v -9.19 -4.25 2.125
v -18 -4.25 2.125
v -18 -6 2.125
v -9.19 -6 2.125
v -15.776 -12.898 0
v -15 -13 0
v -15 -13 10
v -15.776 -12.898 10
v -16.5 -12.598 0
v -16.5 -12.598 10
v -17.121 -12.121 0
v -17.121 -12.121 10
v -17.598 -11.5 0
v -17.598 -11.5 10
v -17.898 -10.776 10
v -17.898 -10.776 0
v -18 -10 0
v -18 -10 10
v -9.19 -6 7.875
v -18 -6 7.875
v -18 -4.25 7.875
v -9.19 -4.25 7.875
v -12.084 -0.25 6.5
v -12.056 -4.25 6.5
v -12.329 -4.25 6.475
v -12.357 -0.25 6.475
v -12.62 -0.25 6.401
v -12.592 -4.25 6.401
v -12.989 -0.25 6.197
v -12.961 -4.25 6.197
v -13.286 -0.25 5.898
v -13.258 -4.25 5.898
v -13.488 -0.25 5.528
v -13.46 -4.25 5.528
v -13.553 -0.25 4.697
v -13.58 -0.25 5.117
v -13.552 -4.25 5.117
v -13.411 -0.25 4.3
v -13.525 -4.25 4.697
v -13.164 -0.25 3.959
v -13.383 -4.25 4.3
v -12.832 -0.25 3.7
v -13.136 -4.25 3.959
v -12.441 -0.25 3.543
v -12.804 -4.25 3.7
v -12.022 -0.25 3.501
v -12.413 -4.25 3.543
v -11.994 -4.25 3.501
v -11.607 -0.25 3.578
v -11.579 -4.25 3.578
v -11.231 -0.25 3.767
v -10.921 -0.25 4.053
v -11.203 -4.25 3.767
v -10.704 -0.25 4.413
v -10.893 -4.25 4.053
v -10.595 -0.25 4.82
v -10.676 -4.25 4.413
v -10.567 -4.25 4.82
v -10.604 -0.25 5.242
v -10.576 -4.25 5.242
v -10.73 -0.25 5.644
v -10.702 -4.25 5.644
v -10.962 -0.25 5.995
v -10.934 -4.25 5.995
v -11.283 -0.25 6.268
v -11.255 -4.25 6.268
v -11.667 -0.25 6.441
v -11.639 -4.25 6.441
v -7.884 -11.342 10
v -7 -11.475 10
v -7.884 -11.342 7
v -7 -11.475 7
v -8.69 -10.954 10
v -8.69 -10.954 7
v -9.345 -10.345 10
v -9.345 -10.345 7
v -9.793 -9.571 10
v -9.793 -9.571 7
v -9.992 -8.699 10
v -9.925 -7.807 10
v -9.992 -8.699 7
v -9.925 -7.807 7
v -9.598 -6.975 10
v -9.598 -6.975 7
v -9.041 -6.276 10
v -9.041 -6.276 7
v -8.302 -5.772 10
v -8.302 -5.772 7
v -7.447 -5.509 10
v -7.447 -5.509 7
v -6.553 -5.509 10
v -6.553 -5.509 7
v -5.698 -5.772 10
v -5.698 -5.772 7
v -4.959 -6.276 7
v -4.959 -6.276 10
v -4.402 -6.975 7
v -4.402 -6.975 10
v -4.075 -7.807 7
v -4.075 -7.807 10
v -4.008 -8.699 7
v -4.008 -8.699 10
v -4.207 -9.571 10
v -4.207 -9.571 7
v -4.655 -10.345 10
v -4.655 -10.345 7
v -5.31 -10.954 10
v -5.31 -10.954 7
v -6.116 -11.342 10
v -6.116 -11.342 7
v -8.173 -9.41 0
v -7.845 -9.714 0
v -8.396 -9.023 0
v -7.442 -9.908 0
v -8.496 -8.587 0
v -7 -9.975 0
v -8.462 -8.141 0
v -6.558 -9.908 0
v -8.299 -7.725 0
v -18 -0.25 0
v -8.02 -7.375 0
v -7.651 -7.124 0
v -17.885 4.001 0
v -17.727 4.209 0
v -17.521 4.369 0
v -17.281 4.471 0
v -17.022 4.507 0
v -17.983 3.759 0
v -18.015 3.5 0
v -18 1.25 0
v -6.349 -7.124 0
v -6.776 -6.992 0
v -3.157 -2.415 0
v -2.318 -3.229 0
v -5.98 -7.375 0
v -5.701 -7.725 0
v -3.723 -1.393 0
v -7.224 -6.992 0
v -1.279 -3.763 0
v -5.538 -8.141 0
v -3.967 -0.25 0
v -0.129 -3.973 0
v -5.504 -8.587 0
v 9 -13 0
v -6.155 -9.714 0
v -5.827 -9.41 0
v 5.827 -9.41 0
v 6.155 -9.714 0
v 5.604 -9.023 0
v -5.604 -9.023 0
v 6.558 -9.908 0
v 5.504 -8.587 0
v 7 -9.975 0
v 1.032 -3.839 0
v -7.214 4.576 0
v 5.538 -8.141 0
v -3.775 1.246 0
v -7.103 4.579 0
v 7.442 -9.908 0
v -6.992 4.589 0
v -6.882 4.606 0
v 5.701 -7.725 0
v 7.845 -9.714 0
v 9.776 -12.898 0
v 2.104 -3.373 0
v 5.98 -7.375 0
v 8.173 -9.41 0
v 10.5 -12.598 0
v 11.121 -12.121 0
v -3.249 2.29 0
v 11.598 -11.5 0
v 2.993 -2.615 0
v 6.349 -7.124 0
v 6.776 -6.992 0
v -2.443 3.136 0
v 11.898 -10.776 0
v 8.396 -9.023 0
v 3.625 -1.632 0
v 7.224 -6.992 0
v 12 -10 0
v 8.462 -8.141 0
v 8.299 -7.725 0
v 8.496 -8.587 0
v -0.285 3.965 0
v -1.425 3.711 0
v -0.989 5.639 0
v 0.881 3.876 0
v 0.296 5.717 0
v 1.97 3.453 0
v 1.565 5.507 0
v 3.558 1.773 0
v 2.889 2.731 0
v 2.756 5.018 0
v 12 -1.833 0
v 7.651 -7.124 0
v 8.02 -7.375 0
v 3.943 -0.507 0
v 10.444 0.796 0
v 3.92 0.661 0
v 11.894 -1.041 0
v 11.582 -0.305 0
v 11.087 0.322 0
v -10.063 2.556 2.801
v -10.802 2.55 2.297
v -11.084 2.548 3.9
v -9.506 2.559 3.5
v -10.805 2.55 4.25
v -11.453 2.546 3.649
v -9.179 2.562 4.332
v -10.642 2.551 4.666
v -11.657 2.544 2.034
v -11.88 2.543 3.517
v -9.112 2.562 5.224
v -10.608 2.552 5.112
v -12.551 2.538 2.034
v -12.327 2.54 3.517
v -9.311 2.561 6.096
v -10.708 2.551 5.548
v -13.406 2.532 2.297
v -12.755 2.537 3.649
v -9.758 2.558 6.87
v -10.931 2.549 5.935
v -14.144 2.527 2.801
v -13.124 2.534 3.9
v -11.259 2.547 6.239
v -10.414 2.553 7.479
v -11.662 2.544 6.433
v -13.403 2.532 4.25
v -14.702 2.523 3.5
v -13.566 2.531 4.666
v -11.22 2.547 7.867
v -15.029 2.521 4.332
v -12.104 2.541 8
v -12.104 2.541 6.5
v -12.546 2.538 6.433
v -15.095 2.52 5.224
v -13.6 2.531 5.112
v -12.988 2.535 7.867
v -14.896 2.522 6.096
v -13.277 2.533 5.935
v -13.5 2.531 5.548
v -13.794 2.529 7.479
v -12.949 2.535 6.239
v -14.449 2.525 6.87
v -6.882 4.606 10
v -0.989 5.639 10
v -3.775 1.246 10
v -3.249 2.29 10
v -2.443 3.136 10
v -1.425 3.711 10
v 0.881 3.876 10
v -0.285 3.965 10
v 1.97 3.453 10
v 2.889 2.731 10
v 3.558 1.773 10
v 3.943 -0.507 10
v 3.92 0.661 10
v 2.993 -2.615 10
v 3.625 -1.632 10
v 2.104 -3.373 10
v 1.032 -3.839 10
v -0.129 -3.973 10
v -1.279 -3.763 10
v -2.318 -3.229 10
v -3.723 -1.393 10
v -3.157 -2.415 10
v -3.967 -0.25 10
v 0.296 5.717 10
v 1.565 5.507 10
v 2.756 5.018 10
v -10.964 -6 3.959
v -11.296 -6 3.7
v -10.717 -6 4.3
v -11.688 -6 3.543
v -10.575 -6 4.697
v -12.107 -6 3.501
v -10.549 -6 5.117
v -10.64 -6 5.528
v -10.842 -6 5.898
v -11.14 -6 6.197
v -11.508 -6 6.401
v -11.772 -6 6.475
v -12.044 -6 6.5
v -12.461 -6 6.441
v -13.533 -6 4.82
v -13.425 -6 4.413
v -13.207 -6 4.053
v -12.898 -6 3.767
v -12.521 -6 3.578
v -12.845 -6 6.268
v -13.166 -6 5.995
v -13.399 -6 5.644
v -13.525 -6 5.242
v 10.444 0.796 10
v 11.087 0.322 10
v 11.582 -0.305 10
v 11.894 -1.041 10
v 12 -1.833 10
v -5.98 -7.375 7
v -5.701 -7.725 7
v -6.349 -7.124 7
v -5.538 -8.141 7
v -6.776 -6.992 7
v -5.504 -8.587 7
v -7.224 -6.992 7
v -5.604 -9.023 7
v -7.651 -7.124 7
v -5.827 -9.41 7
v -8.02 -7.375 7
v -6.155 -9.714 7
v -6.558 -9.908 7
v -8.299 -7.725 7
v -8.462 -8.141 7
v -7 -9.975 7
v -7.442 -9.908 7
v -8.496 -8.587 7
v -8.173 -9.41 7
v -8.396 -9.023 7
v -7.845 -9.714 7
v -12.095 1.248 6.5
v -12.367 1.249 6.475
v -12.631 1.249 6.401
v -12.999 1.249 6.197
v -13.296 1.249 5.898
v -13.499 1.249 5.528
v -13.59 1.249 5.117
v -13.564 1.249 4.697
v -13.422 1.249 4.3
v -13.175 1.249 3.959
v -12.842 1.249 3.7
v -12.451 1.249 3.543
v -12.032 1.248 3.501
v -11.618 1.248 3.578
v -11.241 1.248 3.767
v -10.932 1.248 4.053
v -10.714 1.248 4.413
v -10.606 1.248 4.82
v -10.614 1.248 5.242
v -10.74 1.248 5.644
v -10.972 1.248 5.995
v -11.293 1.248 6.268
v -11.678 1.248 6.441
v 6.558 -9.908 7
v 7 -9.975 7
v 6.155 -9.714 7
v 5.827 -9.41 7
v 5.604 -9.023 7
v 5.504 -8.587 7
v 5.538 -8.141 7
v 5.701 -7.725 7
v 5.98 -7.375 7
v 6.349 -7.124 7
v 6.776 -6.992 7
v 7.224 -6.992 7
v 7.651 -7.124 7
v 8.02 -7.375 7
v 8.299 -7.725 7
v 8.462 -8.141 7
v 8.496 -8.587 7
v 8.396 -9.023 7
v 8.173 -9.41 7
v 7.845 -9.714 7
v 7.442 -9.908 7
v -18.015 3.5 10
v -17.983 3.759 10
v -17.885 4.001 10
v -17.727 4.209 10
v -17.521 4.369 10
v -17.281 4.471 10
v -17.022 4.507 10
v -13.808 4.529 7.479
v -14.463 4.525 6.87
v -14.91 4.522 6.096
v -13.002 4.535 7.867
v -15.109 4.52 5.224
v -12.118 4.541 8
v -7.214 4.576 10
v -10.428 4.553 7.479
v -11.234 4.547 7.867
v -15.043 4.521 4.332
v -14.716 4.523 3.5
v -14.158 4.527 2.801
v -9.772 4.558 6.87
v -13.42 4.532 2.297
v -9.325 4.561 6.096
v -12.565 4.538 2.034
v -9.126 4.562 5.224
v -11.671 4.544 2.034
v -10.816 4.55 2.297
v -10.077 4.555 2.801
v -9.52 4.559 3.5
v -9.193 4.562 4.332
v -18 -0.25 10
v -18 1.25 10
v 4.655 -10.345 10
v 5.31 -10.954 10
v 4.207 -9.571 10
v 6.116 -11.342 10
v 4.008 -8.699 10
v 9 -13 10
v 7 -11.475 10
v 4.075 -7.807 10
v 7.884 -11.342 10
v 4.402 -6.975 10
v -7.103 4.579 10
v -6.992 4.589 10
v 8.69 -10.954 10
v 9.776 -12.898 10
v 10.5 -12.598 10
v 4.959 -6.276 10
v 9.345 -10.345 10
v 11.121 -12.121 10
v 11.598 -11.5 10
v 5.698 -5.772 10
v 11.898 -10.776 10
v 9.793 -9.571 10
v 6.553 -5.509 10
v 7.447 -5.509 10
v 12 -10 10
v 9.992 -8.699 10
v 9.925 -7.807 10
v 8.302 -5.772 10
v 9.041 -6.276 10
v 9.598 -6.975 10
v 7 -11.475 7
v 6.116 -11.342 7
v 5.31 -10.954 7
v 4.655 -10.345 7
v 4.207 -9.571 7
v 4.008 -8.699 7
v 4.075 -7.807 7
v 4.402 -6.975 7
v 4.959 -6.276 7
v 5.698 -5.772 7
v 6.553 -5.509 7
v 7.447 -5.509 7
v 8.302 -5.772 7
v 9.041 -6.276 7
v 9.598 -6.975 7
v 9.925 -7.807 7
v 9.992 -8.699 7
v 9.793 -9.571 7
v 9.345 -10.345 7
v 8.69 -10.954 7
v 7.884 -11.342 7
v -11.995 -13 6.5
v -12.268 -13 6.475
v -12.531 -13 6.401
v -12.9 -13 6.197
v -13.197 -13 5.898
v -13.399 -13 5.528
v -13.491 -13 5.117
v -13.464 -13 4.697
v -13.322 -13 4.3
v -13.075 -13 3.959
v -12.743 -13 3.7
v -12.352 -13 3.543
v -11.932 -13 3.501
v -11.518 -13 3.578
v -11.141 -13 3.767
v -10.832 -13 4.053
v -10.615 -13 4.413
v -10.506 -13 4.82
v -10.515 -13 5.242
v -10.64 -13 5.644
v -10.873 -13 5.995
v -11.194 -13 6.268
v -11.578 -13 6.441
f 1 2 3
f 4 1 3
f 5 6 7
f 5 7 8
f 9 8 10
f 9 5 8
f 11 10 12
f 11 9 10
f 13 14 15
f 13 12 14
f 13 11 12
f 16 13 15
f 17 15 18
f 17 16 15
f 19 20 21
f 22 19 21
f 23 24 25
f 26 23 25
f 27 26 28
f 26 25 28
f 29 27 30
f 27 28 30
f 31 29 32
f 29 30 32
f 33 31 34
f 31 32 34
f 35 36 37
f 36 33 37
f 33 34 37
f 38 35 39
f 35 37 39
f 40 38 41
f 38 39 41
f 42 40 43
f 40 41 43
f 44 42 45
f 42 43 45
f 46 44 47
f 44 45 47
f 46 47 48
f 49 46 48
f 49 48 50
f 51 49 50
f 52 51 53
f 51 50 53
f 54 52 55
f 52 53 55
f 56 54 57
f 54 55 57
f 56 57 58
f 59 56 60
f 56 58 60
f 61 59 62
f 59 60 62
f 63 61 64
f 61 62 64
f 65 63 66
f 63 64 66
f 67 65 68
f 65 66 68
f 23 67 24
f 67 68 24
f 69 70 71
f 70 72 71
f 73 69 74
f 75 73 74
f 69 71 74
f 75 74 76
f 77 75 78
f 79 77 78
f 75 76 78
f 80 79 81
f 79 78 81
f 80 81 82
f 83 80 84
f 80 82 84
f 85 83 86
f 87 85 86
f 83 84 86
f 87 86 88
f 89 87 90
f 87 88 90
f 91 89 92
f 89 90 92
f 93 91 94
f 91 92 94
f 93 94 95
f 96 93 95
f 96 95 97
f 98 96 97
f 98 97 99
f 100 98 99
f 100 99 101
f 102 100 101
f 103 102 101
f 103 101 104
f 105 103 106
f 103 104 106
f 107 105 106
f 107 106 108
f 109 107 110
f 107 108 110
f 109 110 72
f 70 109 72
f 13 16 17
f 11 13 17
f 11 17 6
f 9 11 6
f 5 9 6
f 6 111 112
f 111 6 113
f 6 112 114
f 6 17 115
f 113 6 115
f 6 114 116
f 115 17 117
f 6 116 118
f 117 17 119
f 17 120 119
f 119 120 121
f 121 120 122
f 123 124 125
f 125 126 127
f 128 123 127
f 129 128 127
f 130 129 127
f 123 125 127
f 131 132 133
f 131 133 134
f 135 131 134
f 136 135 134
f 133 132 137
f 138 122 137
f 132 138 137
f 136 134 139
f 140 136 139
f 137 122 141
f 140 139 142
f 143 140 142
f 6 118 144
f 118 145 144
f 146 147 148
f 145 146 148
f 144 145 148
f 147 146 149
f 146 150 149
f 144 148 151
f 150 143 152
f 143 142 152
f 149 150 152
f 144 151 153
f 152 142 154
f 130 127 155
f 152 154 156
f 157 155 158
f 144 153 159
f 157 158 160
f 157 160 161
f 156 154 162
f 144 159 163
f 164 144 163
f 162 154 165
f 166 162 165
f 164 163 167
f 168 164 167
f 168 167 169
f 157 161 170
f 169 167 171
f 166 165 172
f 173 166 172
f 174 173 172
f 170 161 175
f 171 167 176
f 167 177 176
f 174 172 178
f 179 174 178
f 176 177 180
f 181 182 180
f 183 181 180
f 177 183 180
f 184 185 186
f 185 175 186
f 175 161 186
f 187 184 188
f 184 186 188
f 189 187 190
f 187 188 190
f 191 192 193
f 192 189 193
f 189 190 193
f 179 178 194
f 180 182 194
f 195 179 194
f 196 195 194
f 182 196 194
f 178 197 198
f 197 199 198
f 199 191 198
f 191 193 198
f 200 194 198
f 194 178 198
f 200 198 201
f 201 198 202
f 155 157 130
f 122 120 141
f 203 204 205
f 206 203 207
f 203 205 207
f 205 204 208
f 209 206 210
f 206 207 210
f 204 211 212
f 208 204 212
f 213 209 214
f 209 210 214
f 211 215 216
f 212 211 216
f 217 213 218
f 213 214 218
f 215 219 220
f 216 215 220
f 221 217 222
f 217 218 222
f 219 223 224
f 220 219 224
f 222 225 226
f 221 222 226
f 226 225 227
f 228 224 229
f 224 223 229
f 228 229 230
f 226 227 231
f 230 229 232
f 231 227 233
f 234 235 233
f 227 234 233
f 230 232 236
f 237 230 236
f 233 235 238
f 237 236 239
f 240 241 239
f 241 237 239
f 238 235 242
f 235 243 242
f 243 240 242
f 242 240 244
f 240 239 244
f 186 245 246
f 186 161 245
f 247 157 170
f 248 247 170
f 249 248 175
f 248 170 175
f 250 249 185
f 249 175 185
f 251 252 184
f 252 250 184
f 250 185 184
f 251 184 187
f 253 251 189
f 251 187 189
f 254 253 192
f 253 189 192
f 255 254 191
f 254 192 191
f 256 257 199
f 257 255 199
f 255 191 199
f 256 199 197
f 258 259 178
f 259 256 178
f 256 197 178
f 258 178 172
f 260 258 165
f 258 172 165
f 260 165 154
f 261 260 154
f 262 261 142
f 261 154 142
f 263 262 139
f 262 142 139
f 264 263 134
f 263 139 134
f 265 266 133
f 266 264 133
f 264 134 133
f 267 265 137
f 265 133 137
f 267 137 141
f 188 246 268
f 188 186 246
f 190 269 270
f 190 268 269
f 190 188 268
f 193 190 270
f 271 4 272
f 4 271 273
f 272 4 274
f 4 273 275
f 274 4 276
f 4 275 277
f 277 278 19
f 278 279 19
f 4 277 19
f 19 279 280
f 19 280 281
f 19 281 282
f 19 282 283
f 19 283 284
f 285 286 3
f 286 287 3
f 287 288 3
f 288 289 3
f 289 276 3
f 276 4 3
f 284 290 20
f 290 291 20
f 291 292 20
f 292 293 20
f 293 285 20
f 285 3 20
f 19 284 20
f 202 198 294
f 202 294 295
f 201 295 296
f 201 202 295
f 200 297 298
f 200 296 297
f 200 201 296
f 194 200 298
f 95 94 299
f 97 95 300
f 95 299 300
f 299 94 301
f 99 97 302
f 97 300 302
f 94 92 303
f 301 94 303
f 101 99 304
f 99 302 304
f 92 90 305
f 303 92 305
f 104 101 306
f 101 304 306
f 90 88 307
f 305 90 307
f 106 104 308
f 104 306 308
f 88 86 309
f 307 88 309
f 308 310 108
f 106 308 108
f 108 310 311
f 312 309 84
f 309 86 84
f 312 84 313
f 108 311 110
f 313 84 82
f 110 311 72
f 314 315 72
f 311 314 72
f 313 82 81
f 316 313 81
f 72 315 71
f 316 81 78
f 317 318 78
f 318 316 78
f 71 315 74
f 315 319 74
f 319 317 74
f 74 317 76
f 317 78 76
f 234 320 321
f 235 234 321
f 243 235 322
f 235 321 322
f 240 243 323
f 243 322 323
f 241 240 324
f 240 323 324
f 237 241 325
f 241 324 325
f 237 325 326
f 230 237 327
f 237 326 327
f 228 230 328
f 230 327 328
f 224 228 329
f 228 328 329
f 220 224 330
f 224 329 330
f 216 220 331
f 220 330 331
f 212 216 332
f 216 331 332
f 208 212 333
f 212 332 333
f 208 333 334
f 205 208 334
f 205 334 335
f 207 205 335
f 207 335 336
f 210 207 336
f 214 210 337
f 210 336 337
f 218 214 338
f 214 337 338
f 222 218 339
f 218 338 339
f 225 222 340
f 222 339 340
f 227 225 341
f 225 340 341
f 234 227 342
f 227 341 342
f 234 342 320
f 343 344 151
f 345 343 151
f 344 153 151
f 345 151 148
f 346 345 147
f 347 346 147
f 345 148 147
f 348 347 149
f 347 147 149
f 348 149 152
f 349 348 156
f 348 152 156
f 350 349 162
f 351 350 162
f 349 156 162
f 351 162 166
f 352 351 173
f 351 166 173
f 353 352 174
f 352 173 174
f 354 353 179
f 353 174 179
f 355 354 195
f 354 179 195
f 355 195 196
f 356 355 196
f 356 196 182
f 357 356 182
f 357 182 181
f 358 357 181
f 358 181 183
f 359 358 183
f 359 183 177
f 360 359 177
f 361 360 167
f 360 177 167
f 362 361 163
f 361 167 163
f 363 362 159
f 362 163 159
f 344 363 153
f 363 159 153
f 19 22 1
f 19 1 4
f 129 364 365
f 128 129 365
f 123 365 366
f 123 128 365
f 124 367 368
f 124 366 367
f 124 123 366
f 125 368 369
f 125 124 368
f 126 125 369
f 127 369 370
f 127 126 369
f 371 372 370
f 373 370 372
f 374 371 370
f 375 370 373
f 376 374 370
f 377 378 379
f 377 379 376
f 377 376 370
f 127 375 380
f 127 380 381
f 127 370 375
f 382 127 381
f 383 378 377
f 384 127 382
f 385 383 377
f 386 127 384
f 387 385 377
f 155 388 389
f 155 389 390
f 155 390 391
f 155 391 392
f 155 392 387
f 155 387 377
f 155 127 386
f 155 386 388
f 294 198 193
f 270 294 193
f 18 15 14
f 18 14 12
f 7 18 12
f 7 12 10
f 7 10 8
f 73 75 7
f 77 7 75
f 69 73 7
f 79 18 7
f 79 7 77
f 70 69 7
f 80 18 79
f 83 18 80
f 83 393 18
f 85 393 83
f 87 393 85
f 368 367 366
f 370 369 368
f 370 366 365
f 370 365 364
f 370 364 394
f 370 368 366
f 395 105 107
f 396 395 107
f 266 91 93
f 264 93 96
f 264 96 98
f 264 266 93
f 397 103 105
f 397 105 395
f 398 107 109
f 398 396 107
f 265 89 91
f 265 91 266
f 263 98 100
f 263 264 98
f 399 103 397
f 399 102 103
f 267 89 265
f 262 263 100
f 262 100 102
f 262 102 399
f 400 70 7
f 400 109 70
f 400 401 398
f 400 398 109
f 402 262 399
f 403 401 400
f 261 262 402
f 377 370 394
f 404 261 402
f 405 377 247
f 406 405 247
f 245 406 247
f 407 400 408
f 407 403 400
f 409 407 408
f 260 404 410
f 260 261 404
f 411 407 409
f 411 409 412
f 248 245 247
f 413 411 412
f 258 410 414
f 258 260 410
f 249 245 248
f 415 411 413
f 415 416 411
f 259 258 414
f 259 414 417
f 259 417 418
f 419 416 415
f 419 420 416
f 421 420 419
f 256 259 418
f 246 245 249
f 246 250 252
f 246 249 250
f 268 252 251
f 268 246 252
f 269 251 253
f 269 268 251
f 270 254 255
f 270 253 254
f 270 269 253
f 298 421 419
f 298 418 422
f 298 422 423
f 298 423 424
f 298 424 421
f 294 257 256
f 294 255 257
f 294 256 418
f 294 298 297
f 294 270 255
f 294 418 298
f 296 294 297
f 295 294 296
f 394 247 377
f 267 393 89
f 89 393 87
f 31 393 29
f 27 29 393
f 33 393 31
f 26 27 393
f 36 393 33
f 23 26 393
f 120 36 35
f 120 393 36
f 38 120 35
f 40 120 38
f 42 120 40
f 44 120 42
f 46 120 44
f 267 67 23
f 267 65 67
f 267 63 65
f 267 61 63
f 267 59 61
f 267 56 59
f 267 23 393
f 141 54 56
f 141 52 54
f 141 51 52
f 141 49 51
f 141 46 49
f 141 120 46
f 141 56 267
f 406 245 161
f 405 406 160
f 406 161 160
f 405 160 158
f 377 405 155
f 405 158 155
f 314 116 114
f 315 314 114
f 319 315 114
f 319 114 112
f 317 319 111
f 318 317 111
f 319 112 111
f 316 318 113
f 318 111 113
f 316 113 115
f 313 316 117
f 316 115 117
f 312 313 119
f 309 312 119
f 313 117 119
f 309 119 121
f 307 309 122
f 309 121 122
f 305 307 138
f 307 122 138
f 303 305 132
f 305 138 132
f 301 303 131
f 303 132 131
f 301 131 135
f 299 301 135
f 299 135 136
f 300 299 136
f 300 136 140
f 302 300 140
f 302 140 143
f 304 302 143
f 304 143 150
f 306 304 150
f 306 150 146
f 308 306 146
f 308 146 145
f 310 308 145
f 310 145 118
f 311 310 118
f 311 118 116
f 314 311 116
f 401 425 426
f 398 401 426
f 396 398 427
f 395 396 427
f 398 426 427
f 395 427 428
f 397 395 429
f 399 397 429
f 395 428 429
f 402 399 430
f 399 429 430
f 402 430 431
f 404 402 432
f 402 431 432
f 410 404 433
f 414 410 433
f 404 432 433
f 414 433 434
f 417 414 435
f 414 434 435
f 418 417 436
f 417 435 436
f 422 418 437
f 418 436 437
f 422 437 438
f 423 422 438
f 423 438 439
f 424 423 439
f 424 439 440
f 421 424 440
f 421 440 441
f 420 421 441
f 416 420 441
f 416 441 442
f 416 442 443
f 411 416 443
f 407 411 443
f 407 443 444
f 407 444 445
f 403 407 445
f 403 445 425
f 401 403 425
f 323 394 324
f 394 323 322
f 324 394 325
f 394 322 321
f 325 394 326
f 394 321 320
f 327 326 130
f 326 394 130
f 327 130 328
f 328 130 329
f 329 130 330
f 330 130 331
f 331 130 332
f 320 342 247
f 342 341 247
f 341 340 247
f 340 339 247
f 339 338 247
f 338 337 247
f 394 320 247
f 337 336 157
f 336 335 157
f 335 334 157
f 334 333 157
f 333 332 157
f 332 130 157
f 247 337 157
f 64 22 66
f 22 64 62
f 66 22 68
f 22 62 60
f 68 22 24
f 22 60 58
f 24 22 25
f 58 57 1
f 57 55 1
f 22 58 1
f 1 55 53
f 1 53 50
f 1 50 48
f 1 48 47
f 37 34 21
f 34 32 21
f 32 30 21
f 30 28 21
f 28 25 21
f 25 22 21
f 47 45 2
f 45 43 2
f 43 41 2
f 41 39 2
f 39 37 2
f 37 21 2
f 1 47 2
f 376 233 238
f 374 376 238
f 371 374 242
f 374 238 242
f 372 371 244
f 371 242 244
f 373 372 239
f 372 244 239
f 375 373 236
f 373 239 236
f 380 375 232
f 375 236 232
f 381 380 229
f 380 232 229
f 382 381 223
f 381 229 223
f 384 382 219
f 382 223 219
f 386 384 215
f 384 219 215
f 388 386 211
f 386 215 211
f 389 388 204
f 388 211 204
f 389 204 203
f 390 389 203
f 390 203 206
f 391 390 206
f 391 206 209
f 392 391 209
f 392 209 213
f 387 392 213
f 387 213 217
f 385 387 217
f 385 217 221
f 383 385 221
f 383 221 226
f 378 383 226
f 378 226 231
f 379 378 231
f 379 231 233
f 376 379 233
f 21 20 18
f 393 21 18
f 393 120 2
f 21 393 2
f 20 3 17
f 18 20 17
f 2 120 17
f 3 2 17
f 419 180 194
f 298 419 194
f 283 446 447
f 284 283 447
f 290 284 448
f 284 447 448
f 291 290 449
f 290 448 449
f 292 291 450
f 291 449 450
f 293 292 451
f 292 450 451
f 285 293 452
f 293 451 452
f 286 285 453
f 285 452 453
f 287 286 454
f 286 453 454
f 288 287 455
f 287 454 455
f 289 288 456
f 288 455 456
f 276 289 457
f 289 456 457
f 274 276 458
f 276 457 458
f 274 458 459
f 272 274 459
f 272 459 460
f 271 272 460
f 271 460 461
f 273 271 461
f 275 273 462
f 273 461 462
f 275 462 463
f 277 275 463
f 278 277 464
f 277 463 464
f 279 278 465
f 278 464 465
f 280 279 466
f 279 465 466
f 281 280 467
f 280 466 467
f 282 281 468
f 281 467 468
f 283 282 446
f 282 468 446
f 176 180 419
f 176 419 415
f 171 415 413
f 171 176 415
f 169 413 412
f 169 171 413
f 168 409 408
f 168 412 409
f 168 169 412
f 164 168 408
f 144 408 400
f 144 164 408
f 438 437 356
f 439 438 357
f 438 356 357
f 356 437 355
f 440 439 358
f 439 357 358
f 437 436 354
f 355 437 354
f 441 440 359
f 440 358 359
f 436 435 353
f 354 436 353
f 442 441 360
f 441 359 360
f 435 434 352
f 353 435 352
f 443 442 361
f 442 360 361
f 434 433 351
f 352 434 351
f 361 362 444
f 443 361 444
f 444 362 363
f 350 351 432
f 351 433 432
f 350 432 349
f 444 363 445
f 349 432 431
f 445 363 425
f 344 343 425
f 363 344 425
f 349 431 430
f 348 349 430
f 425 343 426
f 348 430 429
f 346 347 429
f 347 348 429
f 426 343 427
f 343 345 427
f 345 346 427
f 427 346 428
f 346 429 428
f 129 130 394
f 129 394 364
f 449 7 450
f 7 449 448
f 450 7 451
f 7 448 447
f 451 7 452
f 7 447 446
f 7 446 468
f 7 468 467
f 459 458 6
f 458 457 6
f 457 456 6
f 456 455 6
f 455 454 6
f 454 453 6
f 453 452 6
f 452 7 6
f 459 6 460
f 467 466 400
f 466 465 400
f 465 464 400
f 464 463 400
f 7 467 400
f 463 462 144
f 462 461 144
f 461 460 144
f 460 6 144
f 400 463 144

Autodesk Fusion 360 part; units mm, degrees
sketch "Sketch4" plane through (0, 0, 0) normal (0, 0, 1) x (1, 0, 0)
  line L0 (-17.0224, 4.5069) -> (-7.2135, 4.5755)
  line L1 (-6.882, 4.6055) -> (-0.9889, 5.6389)
  line L2 (-18, 0) -> (-17.9997, 1.25) construction
  line L3 (-17.9997, 1.25) -> (-18.0154, 3.5)
  line L4 (-18, 0) -> (-18, -0.25) construction
  line L5 (-18, -0.25) -> (-3.9671, -0.25)
  line L6 (-17.9997, 1.25) -> (-3.7746, 1.2463)
  arc A0 (2.7555, 5.0182) -> (-0.9889, 5.6389) centre (0, 0) ccw
  arc A1 (-3.9671, -0.25) -> (-3.7746, 1.2463) centre (0, 0) ccw
  line L7 (-18, -0.25) -> (-18, -10)
  line L8 (-15, -13) -> (9, -13)
  line L9 (12, -10) -> (12, -1.8332)
  line L10 (10.444, 0.7965) -> (2.7555, 5.0182)
  arc A2 (-7.2135, 4.5755) -> (-6.882, 4.6055) centre (-7.2274, 6.5754) ccw
  arc A3 (-7.2135, 4.5755) -> (-6.882, 4.6055) centre (-7.2274, 6.5754) ccw
  arc A4 (12, -1.8332) -> (10.444, 0.7965) centre (9, -1.8332) ccw
  arc A5 (9, -13) -> (12, -10) centre (9, -10) ccw
  arc A6 (-18, -10) -> (-15, -13) centre (-15, -10) ccw
  arc A7 (-17.0224, 4.5069) -> (-18.0154, 3.5) centre (-17.0154, 3.507) ccw
  point P0 (-18.0224, 4.4999)
  dimension "d18" = 7.95
  dimension "d22" = 18
  dimension "d24" = 4.5
  dimension "d26" = 1.25
  dimension "d27" = 0.25
  dimension "d28" = 2
  dimension "d29" = 3
  dimension "d30" = 3
  dimension "d31" = 1
  dimension "d56" = 1.75
extrude "Extrude2" add sketch "Sketch4" along normal blind 10 makes body 1
sketch "Sketch5" plane through (-0.0323, 4.6256, 0) normal (-0.007, 1, 0) x (-1, -0.007, 0)
  line L0 (7.1813, 0) -> (16.9905, 0)
  line L1 (16.9905, 0) -> (16.9905, 10)
  line L2 (16.9905, 10) -> (7.1813, 10)
  line L3 (7.1813, 10) -> (7.1813, 0)
  line L4 (12.0859, 10) -> (12.0859, 0) construction
  line L5 (16.9905, 5) -> (7.1813, 5) construction
hole "Hole2" at (-12.1179, 4.5412, 5) direction (0.007, -1, 0) diameter 3 end through all counterbore diameter 6 counterbore depth 2 bodies 1 1
sketch "Sketch6" plane through (0, 0, 10) normal (0, 0, 1) x (-1, 0, 0)
  line L0 (7.2135, -4.5755) -> (17.0224, -4.5069)
  arc A0 (17.0224, -4.5069) -> (18.0154, -3.5) centre (17.0154, -3.507) ccw
  line L1 (18.0154, -3.5) -> (17.9997, -1.25)
  line L2 (17.9997, -1.25) -> (3.7746, -1.2463)
  arc A1 (3.9671, 0.25) -> (3.7746, -1.2463) centre (0, 0) ccw
  line L3 (3.9671, 0.25) -> (18, 0.25)
  line L4 (18, 0.25) -> (18, 10)
  arc A2 (18, 10) -> (15, 13) centre (15, 10) ccw
  line L5 (15, 13) -> (-9, 13)
  arc A3 (-9, 13) -> (-12, 10) centre (-9, 10) ccw
  line L6 (-12, 10) -> (-12, 1.8332)
  arc A4 (-12, 1.8332) -> (-10.444, -0.7965) centre (-9, 1.8332) ccw
  line L7 (-10.444, -0.7965) -> (-2.7555, -5.0182)
  arc A5 (-2.7555, -5.0182) -> (0.9889, -5.6389) centre (0, 0) ccw
  line L8 (0.9889, -5.6389) -> (6.882, -4.6055)
  arc A6 (7.2135, -4.5755) -> (6.882, -4.6055) centre (7.2274, -6.5754) ccw
  line L9 (0, 0) -> (0, 3.975) construction
  line L10 (0, 3.975) -> (-12, 3.975) construction
  line L11 (-12, 3.975) -> (-12, 12.975) construction
  line L12 (-12, 8.475) -> (18, 8.475) construction
  line L13 (0, 3.975) -> (0, 13) construction
  line L14 (7, 8.475) -> (7, 6.4233) construction
  point P0 (-7, 8.475)
  point P1 (7, 8.475)
  dimension "d39" = 9
  dimension "d54" = 14
  dimension "d55" = 7
hole "Hole3" at (7, -8.475, 10) direction (0, 0, -1) diameter 3 end through all counterbore diameter 6 counterbore depth 3 bodies 1 1
hole "Hole4" at (-7, -8.475, 10) direction (0, 0, -1) diameter 3 end through all counterbore diameter 6 counterbore depth 3 bodies 1 1
sketch "Sketch7" plane through (-18, 0, 0) normal (-1, 0, 0) x (0, -1, 0)
  line L0 (0.25, 0) -> (10, 0)
  line L1 (10, 0) -> (10, 10)
  line L2 (10, 10) -> (0.25, 10)
  line L3 (0.25, 10) -> (0.25, 0)
  line L4 (5.125, 10) -> (5.125, 0) construction
  line L5 (10, 5) -> (0.25, 5) construction
  line L6 (6, 7.875) -> (4.25, 7.875)
  line L7 (4.25, 7.875) -> (4.25, 2.125)
  line L8 (4.25, 2.125) -> (6, 2.125)
  line L9 (6, 2.125) -> (6, 7.875)
  line L10 (6, 7.875) -> (4.25, 2.125) construction
  line L11 (4.25, 7.875) -> (6, 2.125) construction
  point P0 (5.125, 5)
  dimension "d50" = 1.75
  dimension "d51" = 5.75
extrude "Extrude3" cut sketch "Sketch7" against normal blind 8.81 contours L6 L7 L8 L9 bodies 1
copy_body "Body->Comp1" bodies 1 removing the originals makes body 2 in component "Guide Rail Clamp 1st Direction"
component "Guide Rail Clamp 1st Direction" placed x (1, 0, 0) y (0, 1, 0) z (0, 0, 1) at (0, 0, 0)
